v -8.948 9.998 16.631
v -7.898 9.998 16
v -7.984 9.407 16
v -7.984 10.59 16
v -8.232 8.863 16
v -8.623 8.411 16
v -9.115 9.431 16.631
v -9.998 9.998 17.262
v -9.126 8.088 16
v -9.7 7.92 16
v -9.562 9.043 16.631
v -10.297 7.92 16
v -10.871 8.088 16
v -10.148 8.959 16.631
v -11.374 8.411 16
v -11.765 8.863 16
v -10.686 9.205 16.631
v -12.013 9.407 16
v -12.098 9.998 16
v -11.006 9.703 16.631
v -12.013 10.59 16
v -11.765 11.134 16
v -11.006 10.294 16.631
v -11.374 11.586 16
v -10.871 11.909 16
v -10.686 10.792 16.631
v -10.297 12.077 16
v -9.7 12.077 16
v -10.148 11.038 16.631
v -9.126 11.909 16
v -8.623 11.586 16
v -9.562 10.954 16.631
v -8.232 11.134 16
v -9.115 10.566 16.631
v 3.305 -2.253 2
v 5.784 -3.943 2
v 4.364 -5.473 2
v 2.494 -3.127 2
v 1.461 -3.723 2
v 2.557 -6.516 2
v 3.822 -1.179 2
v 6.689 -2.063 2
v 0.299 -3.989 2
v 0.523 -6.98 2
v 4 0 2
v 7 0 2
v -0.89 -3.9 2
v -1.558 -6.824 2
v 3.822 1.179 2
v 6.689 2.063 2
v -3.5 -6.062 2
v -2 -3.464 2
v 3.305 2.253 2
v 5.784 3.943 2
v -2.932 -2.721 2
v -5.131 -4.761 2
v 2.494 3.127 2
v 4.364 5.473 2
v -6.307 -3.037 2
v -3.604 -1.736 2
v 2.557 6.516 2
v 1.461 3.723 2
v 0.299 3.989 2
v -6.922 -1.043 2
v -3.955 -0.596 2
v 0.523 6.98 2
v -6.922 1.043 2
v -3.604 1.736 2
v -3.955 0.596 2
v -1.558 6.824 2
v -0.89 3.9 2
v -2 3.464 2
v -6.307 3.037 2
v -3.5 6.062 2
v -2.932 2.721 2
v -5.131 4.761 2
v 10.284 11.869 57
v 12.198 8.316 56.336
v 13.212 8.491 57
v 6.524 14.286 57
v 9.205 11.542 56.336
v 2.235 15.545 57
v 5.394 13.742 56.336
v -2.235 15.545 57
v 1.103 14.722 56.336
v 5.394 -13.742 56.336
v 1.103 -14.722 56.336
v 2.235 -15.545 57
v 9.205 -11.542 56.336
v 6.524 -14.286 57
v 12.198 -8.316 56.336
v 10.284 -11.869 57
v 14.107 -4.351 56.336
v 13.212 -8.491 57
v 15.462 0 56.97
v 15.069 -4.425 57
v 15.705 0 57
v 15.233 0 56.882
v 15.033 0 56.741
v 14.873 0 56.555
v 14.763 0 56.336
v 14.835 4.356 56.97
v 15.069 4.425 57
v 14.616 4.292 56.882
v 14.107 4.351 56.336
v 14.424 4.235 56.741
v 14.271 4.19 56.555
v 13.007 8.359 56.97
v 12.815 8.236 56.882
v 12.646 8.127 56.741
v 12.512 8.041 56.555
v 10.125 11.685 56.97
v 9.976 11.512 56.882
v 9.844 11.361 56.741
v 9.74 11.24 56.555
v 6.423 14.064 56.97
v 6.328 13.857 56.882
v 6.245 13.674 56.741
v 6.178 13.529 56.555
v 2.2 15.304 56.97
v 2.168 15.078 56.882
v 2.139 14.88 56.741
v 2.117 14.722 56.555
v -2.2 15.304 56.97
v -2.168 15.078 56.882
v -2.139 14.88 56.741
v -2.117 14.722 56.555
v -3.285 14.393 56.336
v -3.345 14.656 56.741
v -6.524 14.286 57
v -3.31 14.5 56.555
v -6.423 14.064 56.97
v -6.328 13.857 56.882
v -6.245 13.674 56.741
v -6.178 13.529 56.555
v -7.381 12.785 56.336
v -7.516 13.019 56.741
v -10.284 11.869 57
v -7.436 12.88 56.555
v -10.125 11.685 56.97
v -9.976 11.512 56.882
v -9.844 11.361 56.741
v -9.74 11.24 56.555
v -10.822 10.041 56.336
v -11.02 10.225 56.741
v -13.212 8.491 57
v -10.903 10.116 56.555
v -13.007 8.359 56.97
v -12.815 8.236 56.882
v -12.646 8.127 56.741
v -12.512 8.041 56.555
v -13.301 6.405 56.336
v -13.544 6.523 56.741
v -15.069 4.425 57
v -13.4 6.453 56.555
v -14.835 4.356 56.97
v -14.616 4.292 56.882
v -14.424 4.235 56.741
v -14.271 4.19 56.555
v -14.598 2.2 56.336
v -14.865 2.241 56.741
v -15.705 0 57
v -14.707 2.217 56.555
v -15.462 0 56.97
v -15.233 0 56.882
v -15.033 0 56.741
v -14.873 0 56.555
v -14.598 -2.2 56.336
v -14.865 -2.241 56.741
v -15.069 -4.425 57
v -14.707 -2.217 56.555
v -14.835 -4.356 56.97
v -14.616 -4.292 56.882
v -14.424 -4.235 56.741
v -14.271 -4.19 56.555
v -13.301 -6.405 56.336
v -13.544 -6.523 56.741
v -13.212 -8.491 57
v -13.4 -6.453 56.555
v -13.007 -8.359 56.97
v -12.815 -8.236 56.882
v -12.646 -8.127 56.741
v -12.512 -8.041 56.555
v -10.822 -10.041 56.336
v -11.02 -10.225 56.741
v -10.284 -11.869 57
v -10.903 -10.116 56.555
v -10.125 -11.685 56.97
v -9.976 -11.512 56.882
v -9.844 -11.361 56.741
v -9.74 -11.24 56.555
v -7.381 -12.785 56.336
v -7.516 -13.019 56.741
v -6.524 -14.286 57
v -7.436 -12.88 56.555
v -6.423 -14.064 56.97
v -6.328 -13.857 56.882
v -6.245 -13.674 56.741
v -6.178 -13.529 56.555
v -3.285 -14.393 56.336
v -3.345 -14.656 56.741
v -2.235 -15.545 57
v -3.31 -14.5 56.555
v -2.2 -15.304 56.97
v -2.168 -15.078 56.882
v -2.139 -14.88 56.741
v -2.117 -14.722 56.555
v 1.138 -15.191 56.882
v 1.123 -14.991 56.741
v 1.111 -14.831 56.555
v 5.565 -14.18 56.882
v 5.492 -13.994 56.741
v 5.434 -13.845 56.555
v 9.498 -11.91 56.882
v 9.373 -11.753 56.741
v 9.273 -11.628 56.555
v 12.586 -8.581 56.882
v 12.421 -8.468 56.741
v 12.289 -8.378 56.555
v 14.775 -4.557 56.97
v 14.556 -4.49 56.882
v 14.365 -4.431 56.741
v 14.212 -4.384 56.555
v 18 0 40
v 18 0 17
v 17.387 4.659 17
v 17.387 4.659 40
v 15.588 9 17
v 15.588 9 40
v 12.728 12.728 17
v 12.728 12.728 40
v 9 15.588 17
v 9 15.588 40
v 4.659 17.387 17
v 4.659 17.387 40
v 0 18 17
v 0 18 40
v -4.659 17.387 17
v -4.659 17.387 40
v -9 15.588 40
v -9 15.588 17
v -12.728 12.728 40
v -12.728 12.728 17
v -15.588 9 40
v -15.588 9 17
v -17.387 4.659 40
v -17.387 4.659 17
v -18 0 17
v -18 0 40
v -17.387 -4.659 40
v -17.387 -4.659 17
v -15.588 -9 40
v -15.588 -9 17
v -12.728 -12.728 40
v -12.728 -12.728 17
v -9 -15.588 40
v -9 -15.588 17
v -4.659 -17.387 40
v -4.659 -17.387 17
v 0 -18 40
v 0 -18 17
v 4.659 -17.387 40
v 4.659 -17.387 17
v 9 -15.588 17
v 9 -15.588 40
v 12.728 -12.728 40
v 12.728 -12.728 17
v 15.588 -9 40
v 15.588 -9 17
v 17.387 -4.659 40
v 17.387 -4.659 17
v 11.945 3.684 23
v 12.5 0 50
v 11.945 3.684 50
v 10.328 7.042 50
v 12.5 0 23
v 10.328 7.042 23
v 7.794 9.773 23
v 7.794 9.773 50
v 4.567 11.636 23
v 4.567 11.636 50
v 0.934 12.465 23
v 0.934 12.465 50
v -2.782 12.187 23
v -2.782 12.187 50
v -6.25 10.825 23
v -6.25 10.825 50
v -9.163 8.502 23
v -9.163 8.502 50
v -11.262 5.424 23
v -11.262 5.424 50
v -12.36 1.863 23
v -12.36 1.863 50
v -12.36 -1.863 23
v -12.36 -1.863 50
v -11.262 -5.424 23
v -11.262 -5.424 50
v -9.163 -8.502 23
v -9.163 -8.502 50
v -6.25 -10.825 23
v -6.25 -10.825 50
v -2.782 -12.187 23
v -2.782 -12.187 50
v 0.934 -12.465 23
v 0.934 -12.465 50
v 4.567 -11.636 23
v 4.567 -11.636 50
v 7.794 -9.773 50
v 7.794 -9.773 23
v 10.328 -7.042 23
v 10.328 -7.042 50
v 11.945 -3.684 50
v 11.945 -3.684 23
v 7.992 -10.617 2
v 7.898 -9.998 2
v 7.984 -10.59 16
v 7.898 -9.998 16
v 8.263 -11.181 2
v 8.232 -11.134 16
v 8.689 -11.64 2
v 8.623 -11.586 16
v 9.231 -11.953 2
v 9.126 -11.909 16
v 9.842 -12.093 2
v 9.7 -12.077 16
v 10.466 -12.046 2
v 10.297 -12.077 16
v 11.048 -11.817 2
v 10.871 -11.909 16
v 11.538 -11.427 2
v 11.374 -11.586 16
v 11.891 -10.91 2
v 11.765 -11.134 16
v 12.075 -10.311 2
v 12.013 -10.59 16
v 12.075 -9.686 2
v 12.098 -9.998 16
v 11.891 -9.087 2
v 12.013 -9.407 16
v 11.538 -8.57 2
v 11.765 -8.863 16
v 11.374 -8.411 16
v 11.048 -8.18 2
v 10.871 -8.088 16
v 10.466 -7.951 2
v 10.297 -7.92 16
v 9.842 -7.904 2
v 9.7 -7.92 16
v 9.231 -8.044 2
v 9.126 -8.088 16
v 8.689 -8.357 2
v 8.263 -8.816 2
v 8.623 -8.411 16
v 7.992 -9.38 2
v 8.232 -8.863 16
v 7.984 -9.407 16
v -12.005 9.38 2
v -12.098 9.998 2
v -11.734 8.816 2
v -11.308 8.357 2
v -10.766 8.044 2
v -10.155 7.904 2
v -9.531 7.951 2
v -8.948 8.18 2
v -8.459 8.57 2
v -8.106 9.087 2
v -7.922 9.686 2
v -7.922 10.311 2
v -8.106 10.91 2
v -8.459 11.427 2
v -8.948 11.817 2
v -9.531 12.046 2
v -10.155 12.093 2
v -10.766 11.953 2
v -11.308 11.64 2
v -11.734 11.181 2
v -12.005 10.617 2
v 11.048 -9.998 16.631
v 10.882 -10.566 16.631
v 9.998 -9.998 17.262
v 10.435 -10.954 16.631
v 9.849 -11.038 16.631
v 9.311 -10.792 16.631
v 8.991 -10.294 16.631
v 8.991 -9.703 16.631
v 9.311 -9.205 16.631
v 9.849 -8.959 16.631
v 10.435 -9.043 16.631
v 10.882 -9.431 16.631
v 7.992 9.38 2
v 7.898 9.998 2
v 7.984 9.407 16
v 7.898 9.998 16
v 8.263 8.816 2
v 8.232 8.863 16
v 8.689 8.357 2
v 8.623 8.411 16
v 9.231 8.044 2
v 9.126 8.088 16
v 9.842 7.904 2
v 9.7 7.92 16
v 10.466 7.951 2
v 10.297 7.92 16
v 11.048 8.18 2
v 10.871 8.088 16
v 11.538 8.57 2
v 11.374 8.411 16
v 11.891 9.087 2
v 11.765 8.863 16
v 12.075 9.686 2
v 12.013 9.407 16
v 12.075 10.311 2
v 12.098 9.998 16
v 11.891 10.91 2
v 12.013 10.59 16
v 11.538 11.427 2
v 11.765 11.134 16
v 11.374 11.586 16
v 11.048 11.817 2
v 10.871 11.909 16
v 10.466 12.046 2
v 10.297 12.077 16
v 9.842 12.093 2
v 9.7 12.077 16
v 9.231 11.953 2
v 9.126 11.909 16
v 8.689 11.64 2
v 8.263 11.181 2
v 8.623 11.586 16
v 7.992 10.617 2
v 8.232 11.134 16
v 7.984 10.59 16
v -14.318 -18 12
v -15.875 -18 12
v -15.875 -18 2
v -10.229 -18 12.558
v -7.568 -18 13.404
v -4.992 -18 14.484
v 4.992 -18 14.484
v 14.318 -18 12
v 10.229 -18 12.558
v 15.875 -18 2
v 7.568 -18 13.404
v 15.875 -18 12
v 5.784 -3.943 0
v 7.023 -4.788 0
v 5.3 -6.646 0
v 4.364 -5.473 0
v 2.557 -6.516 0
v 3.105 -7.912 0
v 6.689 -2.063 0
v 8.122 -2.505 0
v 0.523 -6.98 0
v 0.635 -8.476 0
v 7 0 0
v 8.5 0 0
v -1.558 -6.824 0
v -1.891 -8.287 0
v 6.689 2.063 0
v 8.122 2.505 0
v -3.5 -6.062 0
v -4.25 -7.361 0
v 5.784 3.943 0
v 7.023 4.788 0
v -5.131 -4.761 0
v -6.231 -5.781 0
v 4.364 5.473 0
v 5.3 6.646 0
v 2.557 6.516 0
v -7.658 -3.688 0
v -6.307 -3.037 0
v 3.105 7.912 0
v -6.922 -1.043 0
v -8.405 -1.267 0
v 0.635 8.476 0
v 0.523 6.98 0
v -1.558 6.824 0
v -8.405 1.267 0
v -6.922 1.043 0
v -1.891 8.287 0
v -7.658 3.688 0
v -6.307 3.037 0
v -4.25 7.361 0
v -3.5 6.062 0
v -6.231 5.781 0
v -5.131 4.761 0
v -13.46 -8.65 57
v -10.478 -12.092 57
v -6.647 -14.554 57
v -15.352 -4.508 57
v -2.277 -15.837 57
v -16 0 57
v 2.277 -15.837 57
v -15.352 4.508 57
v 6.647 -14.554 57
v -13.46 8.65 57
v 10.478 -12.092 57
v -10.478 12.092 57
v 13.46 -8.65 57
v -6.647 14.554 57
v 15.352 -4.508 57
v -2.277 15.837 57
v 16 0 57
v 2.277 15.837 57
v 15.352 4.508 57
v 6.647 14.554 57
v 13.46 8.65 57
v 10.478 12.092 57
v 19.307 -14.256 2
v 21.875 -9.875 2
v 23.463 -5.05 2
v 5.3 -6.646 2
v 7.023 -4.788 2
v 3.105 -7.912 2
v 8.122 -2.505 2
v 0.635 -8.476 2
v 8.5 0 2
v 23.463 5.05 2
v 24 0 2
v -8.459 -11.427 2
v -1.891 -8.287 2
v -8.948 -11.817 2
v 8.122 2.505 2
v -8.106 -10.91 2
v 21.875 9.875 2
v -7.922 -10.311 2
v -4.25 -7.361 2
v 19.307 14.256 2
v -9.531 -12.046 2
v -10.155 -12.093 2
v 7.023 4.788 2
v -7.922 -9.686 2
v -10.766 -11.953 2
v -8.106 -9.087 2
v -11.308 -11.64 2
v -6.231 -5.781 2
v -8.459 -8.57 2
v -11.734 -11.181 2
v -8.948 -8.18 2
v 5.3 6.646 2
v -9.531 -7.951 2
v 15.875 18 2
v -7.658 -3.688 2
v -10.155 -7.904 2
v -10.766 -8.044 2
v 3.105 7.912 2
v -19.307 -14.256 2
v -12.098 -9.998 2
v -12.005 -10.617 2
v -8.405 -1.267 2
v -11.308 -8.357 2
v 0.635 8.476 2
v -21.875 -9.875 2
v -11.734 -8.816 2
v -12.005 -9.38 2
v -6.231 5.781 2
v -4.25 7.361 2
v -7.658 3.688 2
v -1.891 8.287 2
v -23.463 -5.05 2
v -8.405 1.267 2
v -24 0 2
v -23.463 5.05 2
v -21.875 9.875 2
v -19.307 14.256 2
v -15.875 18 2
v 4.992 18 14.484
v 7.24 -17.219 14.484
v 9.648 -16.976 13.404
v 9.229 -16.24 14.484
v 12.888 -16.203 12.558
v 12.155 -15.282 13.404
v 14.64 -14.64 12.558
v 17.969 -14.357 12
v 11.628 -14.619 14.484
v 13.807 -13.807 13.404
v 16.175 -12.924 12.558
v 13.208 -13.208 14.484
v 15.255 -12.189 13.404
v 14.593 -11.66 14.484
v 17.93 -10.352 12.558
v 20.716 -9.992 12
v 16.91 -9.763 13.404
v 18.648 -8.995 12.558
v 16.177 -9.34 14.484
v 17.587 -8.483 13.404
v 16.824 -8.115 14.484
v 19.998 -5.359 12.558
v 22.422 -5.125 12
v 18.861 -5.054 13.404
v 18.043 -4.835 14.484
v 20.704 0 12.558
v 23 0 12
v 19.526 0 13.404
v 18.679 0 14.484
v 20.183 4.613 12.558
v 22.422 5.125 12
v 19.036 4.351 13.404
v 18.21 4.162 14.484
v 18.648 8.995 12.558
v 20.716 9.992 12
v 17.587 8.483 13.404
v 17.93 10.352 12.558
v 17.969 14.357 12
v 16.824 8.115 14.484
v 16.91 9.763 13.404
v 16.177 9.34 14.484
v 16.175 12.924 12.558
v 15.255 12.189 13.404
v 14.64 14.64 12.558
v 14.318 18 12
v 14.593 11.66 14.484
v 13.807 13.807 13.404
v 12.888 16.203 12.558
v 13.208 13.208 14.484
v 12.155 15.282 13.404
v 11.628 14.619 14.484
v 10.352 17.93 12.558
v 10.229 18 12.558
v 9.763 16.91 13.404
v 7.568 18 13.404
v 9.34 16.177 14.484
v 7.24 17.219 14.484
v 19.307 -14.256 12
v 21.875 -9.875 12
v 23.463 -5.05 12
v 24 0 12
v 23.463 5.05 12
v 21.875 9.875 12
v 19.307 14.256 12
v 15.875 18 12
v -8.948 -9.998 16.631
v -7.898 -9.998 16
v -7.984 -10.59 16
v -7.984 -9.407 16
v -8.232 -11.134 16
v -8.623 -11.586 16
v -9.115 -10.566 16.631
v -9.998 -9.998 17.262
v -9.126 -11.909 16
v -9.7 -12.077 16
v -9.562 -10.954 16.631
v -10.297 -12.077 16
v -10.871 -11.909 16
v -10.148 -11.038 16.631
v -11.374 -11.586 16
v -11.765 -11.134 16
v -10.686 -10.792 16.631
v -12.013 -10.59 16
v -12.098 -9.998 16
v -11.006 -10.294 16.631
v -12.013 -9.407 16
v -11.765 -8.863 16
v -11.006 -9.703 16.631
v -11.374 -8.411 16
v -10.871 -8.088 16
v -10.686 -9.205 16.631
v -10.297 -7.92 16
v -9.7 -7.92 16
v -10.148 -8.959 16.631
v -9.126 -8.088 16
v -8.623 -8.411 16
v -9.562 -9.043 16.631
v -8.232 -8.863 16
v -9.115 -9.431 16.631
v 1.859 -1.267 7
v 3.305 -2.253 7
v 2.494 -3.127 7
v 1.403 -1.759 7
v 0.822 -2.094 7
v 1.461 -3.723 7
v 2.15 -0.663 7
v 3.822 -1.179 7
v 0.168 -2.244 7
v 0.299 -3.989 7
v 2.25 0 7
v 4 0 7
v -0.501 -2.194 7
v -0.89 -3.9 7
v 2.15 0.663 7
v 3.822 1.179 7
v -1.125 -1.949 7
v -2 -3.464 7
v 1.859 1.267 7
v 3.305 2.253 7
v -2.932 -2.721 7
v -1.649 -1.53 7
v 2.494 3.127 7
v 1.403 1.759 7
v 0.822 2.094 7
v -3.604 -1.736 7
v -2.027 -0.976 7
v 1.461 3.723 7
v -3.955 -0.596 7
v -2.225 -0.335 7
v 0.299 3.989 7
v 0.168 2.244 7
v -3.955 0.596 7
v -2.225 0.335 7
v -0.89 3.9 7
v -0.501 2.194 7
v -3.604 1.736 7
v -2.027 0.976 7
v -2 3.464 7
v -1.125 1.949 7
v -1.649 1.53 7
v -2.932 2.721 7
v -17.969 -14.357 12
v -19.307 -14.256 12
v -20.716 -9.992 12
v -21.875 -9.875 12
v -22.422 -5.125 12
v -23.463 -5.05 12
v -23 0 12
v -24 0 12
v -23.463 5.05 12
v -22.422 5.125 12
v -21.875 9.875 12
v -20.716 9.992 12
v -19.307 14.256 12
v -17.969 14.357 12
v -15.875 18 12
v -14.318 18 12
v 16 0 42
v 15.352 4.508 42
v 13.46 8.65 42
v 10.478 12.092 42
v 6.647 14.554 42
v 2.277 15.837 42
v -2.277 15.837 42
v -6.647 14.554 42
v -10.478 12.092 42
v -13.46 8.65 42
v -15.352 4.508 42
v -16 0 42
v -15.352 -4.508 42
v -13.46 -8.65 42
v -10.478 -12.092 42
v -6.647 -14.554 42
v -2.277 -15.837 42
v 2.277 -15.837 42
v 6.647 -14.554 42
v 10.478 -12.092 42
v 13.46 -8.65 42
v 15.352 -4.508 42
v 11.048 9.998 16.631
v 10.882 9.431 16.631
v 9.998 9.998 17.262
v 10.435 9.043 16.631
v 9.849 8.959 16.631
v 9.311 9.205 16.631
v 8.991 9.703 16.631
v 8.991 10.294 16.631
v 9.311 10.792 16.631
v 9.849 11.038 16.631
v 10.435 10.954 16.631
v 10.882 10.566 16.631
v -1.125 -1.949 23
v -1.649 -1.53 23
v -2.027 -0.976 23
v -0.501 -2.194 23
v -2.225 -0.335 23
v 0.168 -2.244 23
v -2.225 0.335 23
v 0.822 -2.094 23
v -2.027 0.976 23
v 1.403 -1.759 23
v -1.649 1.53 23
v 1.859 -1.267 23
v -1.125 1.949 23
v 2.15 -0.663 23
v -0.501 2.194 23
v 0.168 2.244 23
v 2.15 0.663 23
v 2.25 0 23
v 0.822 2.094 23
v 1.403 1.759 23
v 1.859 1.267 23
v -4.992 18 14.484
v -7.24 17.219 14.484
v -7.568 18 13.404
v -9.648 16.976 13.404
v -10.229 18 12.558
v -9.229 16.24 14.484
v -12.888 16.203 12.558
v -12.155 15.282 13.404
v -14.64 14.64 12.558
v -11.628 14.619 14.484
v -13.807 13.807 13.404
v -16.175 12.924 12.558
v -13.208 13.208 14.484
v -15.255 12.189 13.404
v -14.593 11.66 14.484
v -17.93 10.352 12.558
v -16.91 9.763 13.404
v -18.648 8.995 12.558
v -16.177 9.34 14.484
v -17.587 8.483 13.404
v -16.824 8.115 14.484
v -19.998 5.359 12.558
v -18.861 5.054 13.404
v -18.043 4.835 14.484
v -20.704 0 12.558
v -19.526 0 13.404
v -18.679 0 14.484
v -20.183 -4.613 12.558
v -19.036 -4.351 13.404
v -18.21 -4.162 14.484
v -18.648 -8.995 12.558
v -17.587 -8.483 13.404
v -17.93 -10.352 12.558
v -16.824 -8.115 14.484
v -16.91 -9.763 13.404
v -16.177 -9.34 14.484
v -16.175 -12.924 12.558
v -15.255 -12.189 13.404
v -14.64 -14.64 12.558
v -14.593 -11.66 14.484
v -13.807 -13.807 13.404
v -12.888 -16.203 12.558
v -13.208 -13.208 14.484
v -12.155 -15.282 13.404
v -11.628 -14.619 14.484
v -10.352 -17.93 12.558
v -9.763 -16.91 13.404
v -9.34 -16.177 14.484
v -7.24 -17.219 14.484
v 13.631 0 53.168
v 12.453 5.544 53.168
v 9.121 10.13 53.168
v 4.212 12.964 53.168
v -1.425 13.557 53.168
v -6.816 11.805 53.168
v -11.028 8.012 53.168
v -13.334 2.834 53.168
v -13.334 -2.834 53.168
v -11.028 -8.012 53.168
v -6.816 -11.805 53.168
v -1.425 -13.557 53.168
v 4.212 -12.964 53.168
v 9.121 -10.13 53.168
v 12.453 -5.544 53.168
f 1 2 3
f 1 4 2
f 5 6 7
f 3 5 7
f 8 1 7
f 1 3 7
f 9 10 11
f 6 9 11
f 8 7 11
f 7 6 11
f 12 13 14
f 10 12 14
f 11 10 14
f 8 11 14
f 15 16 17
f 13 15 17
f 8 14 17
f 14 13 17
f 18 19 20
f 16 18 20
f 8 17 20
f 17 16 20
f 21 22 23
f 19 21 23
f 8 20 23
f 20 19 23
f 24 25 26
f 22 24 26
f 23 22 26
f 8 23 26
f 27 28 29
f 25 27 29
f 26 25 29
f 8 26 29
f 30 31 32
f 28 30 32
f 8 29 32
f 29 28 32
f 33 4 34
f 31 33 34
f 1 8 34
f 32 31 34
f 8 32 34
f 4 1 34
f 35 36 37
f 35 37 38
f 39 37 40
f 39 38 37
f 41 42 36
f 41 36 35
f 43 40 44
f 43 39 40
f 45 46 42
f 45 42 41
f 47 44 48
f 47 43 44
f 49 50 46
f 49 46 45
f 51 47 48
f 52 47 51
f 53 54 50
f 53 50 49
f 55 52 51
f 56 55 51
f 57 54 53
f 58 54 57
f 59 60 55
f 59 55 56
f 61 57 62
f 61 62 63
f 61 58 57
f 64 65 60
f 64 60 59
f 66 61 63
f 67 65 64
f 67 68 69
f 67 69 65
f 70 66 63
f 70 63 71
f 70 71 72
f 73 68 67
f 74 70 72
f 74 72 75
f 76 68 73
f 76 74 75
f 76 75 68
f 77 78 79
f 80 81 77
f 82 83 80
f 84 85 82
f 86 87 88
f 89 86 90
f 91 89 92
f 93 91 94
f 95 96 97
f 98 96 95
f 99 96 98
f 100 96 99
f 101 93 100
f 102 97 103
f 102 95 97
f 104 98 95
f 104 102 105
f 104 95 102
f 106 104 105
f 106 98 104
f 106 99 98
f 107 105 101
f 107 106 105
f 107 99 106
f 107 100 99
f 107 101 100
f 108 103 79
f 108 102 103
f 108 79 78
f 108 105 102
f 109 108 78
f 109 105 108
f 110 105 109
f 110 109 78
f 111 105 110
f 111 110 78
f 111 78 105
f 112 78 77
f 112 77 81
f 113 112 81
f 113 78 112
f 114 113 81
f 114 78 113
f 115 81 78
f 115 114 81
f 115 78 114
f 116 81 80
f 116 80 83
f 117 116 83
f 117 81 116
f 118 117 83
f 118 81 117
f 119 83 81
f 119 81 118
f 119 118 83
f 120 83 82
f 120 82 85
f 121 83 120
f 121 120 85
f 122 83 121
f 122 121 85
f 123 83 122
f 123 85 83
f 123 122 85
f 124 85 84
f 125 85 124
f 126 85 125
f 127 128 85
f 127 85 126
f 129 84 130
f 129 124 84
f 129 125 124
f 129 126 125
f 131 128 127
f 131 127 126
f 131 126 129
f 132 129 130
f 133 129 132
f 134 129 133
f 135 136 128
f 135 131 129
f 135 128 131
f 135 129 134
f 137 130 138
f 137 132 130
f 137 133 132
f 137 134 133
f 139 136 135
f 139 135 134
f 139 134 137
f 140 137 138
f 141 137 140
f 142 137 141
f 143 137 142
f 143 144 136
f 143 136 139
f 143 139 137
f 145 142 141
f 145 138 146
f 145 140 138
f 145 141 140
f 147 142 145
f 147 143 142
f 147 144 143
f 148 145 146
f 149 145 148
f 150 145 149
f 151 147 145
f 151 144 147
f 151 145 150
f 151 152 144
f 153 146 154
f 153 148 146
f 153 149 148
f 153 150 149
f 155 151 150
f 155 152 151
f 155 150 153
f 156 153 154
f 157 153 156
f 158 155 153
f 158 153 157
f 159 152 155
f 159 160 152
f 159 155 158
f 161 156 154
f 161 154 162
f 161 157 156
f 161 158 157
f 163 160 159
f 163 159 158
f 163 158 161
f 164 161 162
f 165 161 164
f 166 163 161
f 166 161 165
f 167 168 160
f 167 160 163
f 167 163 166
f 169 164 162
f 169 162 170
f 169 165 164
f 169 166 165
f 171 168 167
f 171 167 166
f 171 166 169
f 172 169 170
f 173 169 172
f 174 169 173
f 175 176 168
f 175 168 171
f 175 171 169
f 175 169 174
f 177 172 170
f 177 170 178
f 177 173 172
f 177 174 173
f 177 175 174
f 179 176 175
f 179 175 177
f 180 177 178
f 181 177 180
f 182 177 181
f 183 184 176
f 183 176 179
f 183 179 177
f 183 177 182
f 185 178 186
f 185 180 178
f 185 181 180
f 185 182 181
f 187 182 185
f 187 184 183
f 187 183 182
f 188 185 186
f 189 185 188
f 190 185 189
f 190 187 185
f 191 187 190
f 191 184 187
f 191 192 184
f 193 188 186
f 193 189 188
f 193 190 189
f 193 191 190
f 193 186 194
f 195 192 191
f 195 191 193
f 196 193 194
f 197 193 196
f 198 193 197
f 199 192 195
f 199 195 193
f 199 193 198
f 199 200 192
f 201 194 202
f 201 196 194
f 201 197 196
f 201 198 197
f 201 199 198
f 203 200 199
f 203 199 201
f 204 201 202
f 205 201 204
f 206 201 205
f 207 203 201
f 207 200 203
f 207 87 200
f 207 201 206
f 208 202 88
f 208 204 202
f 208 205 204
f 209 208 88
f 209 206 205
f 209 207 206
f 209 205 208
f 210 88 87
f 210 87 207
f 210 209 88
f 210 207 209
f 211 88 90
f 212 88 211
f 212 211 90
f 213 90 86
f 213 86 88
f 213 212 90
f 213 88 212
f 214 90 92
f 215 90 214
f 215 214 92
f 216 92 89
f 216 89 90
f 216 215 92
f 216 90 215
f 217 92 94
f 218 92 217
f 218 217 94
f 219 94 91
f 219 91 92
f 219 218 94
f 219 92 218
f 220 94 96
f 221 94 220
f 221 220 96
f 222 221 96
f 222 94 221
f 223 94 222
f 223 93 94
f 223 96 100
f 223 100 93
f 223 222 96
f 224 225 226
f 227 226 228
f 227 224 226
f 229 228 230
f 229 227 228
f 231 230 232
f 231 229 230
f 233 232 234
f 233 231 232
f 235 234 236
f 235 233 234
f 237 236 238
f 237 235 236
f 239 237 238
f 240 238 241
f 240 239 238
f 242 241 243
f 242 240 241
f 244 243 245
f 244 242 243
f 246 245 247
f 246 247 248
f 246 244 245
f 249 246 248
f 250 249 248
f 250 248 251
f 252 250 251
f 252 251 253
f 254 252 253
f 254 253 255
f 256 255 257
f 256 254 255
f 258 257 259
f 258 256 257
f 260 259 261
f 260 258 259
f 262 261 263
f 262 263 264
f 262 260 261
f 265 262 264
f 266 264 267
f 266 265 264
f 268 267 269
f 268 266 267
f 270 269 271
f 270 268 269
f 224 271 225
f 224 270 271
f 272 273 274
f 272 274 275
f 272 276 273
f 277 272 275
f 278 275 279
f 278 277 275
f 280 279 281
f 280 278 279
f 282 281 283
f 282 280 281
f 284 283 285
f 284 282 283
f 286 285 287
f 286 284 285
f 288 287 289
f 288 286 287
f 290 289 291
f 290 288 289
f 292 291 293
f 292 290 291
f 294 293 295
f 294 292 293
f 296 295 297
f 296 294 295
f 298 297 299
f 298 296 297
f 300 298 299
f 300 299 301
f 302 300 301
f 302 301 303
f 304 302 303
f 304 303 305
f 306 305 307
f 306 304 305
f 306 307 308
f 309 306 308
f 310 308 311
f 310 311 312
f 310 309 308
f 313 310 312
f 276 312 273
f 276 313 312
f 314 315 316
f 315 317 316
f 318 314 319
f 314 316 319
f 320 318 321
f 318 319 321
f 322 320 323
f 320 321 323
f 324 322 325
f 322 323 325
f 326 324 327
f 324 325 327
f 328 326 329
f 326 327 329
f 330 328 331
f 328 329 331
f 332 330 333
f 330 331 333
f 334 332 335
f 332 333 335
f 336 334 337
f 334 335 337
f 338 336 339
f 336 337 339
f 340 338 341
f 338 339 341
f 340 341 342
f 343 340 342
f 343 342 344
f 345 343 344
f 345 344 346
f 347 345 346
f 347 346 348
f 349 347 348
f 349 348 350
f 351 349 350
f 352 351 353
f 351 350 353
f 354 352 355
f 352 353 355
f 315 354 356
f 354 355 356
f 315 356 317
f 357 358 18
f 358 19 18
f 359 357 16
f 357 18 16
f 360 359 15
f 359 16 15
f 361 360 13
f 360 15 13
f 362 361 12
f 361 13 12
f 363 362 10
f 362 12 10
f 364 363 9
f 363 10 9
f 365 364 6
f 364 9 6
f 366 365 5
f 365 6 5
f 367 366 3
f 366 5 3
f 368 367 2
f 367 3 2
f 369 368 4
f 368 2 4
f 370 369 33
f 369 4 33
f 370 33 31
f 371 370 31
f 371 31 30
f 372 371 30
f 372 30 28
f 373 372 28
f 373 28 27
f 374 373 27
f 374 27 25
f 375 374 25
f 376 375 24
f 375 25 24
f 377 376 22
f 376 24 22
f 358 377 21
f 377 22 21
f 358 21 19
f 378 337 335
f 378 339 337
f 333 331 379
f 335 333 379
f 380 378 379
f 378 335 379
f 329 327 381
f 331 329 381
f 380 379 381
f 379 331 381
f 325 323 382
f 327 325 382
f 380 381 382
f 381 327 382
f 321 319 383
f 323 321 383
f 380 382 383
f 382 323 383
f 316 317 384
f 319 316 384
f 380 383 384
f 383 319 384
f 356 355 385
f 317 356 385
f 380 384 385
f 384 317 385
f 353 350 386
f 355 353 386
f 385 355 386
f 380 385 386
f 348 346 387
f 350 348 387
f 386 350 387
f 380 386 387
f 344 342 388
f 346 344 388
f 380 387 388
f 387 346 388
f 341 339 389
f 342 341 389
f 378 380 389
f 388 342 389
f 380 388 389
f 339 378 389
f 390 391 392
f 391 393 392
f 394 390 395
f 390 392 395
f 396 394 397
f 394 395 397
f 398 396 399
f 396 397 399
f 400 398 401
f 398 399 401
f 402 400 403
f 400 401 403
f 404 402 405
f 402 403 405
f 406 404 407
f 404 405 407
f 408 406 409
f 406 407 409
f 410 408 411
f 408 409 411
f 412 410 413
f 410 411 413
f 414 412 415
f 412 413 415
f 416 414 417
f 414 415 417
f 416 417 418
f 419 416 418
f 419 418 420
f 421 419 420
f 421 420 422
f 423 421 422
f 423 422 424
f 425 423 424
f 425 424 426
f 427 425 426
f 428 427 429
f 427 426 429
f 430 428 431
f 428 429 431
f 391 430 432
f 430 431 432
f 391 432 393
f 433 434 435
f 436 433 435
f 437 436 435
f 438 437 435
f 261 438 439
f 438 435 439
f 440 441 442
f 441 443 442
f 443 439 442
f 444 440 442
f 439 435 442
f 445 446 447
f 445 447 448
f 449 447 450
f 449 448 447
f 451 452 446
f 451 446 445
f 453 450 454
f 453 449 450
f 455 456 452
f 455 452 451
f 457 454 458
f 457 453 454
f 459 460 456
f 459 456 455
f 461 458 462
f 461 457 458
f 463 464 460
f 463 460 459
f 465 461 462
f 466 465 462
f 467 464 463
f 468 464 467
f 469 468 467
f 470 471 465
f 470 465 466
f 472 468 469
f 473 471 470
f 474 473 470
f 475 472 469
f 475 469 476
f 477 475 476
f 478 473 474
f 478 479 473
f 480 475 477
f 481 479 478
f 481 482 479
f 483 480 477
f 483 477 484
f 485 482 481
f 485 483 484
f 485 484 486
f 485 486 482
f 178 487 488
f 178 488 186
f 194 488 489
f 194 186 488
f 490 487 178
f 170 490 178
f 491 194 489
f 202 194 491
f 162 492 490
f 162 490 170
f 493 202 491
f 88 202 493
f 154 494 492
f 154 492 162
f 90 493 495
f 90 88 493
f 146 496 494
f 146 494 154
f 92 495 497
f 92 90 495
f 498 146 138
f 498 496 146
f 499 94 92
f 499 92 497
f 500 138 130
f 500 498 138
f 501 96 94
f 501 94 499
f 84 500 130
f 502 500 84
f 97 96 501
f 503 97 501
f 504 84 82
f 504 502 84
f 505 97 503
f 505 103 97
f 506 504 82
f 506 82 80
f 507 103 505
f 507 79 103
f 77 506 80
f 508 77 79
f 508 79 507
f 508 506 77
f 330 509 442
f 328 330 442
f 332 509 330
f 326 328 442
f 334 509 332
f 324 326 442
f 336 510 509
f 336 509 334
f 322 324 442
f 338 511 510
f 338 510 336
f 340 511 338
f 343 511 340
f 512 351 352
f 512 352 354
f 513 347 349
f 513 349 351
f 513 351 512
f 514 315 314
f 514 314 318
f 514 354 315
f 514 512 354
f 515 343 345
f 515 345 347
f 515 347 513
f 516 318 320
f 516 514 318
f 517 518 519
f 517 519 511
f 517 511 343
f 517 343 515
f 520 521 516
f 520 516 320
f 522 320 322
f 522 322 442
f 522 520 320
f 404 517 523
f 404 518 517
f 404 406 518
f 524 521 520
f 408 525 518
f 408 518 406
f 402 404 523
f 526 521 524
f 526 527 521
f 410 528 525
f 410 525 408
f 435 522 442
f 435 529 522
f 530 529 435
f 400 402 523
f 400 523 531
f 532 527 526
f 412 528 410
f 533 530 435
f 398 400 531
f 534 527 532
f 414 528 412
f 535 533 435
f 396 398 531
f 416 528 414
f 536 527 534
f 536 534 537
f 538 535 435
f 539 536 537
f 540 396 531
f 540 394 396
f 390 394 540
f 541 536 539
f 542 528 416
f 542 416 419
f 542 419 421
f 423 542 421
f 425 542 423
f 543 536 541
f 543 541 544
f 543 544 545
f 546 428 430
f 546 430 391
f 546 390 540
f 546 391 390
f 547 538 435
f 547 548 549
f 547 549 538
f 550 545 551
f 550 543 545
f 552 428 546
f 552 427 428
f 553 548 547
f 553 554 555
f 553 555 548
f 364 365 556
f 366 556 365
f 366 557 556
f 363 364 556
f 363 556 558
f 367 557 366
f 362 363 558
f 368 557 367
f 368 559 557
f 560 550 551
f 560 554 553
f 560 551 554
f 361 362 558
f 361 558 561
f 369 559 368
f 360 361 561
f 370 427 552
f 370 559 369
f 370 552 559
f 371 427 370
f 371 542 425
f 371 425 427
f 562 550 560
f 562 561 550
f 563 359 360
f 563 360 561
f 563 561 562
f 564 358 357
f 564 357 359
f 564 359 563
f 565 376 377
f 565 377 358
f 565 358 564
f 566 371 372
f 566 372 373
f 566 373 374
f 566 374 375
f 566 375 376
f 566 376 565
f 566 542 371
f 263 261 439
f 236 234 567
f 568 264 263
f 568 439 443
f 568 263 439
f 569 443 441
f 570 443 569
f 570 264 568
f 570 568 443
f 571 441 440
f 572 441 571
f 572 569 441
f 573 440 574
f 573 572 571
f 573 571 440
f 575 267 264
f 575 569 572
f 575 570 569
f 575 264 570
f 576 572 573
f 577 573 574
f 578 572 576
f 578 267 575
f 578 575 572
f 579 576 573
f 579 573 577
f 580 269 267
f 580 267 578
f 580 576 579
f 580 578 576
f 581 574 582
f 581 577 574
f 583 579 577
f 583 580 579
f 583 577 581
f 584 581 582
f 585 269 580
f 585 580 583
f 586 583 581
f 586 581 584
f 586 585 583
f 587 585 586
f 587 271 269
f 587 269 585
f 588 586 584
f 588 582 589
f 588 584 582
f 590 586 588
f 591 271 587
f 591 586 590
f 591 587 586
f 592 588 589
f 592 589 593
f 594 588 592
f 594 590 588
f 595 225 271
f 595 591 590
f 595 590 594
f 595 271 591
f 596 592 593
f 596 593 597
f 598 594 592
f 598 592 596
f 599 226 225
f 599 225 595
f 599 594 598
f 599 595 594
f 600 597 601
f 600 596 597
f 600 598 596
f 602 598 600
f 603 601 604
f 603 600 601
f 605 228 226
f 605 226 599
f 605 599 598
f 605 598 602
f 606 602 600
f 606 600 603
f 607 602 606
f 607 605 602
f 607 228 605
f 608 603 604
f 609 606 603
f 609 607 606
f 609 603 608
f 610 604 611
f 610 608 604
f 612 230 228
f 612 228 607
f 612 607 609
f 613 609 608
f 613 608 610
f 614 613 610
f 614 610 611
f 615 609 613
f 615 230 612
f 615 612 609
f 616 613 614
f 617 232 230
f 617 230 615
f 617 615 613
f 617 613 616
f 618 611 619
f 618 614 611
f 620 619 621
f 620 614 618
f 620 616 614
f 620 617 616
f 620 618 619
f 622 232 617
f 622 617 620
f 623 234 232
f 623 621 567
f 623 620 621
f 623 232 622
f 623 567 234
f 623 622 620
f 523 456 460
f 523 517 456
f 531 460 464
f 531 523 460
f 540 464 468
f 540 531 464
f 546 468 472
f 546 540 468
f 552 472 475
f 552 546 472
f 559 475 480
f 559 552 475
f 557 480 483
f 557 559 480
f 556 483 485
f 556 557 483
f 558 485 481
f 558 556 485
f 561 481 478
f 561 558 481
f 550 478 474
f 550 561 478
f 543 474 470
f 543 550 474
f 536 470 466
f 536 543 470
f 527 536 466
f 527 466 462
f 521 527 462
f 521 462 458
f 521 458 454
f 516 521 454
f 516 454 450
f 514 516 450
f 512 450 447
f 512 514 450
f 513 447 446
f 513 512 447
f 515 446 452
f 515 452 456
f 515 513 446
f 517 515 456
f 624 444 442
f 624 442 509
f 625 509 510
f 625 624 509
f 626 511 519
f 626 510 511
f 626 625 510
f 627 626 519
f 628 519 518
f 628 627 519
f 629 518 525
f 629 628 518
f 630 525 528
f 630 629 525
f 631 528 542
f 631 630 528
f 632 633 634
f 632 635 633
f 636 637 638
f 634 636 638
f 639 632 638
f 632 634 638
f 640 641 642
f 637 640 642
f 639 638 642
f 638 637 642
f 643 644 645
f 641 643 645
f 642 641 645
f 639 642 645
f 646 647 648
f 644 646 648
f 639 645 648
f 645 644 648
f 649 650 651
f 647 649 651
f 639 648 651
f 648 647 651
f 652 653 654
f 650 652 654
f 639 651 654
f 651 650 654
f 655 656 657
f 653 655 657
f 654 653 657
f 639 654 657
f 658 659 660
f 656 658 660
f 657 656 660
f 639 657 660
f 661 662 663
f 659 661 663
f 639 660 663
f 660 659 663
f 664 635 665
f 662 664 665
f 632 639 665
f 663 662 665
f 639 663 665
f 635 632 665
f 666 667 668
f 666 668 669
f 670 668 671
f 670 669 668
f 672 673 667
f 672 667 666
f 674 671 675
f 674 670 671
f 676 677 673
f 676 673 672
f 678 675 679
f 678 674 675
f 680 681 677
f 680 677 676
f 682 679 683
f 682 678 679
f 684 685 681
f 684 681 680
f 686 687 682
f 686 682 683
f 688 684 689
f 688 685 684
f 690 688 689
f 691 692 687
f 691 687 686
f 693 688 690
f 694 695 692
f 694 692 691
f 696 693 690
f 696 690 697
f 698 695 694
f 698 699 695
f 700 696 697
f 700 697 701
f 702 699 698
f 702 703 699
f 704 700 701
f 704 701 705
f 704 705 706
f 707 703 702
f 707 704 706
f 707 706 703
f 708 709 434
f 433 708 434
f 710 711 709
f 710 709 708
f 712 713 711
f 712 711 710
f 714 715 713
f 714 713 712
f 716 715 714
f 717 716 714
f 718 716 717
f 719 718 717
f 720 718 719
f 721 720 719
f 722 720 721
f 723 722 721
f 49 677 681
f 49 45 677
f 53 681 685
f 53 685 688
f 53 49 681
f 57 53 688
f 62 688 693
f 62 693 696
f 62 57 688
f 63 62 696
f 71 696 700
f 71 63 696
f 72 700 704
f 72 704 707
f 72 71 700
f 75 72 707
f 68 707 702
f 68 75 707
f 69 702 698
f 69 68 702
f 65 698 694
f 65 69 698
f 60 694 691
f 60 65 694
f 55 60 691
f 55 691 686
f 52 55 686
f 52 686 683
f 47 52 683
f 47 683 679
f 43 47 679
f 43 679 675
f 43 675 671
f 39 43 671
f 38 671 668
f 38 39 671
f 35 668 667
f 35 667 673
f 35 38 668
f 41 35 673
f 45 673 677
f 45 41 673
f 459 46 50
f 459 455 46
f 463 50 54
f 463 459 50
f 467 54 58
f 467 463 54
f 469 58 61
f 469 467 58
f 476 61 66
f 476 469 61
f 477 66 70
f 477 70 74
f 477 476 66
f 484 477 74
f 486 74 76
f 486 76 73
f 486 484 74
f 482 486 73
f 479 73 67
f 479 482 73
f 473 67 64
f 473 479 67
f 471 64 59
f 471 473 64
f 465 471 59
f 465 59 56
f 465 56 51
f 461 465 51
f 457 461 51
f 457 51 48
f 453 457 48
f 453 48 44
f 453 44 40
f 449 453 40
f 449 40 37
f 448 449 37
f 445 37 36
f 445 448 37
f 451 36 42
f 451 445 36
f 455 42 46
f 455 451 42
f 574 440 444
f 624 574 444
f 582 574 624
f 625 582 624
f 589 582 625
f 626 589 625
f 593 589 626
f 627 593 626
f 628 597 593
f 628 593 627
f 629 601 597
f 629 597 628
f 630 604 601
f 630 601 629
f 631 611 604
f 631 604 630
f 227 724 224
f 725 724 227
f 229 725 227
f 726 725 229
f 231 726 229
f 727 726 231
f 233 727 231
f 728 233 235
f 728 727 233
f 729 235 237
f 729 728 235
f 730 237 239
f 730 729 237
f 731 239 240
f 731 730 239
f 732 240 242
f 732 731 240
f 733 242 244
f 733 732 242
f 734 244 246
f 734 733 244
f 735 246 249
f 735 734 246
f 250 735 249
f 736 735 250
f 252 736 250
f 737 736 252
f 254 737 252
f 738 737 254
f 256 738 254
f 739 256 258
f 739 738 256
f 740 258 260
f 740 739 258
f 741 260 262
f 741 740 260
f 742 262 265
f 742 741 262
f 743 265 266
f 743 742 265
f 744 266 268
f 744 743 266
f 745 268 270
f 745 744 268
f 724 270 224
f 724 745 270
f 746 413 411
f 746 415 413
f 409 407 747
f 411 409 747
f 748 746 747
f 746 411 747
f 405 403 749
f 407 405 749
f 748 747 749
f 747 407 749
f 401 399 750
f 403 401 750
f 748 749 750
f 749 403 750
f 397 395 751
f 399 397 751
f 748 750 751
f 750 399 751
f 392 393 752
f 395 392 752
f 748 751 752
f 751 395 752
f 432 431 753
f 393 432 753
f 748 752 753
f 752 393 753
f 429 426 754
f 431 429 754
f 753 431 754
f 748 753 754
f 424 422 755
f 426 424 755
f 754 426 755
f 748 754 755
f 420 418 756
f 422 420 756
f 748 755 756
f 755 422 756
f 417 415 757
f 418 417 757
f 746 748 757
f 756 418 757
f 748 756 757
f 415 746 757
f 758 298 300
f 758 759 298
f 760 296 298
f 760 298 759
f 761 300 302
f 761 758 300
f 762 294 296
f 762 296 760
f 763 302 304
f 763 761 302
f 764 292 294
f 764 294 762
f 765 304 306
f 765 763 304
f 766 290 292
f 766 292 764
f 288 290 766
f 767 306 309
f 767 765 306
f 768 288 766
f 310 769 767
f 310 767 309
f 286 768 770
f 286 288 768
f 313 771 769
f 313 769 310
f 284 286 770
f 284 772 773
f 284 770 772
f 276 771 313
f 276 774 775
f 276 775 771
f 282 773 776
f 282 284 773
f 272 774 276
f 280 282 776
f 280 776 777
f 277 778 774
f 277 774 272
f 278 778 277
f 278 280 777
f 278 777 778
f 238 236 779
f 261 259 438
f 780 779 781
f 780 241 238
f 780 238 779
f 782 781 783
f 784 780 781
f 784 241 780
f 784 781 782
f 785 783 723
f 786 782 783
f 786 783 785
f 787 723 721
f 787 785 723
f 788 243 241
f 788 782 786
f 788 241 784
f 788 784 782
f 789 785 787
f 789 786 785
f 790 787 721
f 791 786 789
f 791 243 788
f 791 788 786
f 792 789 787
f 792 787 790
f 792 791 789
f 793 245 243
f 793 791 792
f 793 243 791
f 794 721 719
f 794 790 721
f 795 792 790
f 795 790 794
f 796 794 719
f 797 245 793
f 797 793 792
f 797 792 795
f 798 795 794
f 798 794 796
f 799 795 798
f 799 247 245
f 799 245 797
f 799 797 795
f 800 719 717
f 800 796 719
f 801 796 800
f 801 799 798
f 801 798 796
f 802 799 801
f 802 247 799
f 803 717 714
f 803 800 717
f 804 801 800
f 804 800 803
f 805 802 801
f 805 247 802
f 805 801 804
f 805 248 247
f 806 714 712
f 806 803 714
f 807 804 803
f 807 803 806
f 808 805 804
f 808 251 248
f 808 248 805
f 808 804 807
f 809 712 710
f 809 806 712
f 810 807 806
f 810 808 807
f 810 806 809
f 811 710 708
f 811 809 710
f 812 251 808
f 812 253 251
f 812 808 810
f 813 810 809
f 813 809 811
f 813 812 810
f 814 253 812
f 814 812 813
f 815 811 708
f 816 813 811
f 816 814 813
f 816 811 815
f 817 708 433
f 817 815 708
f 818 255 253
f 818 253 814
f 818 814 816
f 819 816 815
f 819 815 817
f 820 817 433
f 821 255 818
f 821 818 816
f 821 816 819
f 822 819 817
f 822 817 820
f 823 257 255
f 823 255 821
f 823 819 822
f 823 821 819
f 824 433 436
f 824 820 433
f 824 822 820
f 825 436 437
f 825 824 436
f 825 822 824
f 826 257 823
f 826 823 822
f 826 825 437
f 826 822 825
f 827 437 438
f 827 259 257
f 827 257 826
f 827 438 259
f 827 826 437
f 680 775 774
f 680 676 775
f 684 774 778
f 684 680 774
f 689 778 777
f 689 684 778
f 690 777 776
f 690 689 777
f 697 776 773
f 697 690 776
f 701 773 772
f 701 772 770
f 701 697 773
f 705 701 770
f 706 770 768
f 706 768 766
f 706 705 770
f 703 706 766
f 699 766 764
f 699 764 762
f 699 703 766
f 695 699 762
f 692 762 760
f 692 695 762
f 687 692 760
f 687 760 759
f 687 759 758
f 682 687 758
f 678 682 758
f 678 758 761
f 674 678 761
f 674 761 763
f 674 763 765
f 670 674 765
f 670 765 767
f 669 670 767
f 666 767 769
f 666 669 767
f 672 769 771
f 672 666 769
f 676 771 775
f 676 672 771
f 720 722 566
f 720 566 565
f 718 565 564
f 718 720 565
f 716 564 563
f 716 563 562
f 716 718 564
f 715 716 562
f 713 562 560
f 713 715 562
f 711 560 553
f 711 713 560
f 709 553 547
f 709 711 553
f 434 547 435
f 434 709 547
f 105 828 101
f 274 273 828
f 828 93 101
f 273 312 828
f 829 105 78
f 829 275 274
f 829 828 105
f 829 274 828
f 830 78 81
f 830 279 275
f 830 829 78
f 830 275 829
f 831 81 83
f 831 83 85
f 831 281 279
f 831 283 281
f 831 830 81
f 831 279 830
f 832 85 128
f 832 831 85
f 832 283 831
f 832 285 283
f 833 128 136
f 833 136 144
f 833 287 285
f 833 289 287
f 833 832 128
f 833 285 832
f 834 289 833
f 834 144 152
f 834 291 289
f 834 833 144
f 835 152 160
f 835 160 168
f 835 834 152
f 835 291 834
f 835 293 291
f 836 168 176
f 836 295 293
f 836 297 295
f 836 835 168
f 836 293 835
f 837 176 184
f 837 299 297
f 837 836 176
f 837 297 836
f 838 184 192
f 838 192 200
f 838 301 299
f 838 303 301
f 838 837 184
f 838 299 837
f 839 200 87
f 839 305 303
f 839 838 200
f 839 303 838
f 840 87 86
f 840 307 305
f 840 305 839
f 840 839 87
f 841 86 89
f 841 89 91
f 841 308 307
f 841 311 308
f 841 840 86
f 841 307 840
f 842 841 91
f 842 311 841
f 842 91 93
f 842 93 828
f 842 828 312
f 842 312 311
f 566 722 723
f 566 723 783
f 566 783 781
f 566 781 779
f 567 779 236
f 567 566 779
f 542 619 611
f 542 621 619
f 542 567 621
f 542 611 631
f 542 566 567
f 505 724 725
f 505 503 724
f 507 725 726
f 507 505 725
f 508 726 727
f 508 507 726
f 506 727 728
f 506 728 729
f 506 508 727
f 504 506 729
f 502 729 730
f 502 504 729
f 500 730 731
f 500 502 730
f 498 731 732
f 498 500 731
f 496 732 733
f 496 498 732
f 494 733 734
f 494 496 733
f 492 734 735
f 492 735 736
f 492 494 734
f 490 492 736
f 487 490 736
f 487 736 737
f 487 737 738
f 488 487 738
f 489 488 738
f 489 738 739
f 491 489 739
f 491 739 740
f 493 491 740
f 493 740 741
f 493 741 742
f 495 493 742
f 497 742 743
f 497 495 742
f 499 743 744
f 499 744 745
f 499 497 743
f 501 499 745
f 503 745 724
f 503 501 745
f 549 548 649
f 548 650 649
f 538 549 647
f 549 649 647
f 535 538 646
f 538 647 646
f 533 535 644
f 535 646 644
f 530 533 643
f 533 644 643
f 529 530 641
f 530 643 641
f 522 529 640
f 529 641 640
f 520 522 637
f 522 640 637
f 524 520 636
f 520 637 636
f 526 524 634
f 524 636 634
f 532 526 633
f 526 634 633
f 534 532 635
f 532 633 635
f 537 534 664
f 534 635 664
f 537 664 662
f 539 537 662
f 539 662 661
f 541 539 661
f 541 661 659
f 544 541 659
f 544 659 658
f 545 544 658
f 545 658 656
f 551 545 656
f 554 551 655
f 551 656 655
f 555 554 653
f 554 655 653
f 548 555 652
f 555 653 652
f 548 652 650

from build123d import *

# Parameters (mm, degrees)
F2_W     = 70
F2_H     = 56
F2_W_2   = 65
F2_H_2   = 36
F3_DEPTH = 57.001
F5_D     = 4.2
F5_DEPTH = 14
F5_TIP   = 1.2618073


with BuildPart() as f1:
    # F0 (on Front) → F1 (revolve)
    with BuildSketch(Plane.XZ):
        with BuildLine():
            Line((4, 7), (4, 2))
            Line((4, 2), (7, 2))
            Line((7, 2), (7, 0))
            Line((7, 0), (8.5, 0))
            Line((8.5, 0), (8.5, 2))
            Line((8.5, 2), (24, 2))
            Line((24, 2), (24, 12))
            Line((24, 12), (23, 12))
            ThreePointArc((23, 12), (19.4644660941, 13.4644660941), (18, 17))
            Line((18, 17), (18, 40))
            Line((18, 40), (16, 42))
            Line((16, 42), (16, 57))
            Line((16, 57), (15.7047191962, 57))
            ThreePointArc((15.7047191962, 57), (15.1286707595, 56.8174155605), (14.7629772846, 56.336336397))
            Line((14.7629772846, 56.336336397), (12.5, 50))
            Line((12.5, 50), (12.5, 23))
            Line((12.5, 23), (2.25, 23))
            Line((2.25, 23), (2.25, 7))
            Line((2.25, 7), (4, 7))
        make_face()
    revolve(axis=Axis((0, 0, 40.597807616), (0, 0, 1)))

    # F2 (on Top) → F3 (cut, through all)
    with BuildSketch(Plane.XY):
        Rectangle(F2_W, F2_H)
        Rectangle(F2_W_2, F2_H_2, mode=Mode.SUBTRACT)
    extrude(amount=F3_DEPTH, mode=Mode.SUBTRACT)

    # F5
    with Locations(Plane(origin=(0, 0, 2), x_dir=(1, 0, 0), z_dir=(0, 0, -1))):
        with Locations((-9.998489886, 9.998489886), (9.998489886, 9.998489886), (9.998489886, -9.998489886), (-9.998489886, -9.998489886)):
            Hole(F5_D / 2, depth=F5_DEPTH)
            with Locations((0, 0, -(F5_DEPTH + F5_TIP / 2))):  # 118° drill point
                Cone(0, F5_D / 2, F5_TIP, mode=Mode.SUBTRACT)


solid = f1.part
